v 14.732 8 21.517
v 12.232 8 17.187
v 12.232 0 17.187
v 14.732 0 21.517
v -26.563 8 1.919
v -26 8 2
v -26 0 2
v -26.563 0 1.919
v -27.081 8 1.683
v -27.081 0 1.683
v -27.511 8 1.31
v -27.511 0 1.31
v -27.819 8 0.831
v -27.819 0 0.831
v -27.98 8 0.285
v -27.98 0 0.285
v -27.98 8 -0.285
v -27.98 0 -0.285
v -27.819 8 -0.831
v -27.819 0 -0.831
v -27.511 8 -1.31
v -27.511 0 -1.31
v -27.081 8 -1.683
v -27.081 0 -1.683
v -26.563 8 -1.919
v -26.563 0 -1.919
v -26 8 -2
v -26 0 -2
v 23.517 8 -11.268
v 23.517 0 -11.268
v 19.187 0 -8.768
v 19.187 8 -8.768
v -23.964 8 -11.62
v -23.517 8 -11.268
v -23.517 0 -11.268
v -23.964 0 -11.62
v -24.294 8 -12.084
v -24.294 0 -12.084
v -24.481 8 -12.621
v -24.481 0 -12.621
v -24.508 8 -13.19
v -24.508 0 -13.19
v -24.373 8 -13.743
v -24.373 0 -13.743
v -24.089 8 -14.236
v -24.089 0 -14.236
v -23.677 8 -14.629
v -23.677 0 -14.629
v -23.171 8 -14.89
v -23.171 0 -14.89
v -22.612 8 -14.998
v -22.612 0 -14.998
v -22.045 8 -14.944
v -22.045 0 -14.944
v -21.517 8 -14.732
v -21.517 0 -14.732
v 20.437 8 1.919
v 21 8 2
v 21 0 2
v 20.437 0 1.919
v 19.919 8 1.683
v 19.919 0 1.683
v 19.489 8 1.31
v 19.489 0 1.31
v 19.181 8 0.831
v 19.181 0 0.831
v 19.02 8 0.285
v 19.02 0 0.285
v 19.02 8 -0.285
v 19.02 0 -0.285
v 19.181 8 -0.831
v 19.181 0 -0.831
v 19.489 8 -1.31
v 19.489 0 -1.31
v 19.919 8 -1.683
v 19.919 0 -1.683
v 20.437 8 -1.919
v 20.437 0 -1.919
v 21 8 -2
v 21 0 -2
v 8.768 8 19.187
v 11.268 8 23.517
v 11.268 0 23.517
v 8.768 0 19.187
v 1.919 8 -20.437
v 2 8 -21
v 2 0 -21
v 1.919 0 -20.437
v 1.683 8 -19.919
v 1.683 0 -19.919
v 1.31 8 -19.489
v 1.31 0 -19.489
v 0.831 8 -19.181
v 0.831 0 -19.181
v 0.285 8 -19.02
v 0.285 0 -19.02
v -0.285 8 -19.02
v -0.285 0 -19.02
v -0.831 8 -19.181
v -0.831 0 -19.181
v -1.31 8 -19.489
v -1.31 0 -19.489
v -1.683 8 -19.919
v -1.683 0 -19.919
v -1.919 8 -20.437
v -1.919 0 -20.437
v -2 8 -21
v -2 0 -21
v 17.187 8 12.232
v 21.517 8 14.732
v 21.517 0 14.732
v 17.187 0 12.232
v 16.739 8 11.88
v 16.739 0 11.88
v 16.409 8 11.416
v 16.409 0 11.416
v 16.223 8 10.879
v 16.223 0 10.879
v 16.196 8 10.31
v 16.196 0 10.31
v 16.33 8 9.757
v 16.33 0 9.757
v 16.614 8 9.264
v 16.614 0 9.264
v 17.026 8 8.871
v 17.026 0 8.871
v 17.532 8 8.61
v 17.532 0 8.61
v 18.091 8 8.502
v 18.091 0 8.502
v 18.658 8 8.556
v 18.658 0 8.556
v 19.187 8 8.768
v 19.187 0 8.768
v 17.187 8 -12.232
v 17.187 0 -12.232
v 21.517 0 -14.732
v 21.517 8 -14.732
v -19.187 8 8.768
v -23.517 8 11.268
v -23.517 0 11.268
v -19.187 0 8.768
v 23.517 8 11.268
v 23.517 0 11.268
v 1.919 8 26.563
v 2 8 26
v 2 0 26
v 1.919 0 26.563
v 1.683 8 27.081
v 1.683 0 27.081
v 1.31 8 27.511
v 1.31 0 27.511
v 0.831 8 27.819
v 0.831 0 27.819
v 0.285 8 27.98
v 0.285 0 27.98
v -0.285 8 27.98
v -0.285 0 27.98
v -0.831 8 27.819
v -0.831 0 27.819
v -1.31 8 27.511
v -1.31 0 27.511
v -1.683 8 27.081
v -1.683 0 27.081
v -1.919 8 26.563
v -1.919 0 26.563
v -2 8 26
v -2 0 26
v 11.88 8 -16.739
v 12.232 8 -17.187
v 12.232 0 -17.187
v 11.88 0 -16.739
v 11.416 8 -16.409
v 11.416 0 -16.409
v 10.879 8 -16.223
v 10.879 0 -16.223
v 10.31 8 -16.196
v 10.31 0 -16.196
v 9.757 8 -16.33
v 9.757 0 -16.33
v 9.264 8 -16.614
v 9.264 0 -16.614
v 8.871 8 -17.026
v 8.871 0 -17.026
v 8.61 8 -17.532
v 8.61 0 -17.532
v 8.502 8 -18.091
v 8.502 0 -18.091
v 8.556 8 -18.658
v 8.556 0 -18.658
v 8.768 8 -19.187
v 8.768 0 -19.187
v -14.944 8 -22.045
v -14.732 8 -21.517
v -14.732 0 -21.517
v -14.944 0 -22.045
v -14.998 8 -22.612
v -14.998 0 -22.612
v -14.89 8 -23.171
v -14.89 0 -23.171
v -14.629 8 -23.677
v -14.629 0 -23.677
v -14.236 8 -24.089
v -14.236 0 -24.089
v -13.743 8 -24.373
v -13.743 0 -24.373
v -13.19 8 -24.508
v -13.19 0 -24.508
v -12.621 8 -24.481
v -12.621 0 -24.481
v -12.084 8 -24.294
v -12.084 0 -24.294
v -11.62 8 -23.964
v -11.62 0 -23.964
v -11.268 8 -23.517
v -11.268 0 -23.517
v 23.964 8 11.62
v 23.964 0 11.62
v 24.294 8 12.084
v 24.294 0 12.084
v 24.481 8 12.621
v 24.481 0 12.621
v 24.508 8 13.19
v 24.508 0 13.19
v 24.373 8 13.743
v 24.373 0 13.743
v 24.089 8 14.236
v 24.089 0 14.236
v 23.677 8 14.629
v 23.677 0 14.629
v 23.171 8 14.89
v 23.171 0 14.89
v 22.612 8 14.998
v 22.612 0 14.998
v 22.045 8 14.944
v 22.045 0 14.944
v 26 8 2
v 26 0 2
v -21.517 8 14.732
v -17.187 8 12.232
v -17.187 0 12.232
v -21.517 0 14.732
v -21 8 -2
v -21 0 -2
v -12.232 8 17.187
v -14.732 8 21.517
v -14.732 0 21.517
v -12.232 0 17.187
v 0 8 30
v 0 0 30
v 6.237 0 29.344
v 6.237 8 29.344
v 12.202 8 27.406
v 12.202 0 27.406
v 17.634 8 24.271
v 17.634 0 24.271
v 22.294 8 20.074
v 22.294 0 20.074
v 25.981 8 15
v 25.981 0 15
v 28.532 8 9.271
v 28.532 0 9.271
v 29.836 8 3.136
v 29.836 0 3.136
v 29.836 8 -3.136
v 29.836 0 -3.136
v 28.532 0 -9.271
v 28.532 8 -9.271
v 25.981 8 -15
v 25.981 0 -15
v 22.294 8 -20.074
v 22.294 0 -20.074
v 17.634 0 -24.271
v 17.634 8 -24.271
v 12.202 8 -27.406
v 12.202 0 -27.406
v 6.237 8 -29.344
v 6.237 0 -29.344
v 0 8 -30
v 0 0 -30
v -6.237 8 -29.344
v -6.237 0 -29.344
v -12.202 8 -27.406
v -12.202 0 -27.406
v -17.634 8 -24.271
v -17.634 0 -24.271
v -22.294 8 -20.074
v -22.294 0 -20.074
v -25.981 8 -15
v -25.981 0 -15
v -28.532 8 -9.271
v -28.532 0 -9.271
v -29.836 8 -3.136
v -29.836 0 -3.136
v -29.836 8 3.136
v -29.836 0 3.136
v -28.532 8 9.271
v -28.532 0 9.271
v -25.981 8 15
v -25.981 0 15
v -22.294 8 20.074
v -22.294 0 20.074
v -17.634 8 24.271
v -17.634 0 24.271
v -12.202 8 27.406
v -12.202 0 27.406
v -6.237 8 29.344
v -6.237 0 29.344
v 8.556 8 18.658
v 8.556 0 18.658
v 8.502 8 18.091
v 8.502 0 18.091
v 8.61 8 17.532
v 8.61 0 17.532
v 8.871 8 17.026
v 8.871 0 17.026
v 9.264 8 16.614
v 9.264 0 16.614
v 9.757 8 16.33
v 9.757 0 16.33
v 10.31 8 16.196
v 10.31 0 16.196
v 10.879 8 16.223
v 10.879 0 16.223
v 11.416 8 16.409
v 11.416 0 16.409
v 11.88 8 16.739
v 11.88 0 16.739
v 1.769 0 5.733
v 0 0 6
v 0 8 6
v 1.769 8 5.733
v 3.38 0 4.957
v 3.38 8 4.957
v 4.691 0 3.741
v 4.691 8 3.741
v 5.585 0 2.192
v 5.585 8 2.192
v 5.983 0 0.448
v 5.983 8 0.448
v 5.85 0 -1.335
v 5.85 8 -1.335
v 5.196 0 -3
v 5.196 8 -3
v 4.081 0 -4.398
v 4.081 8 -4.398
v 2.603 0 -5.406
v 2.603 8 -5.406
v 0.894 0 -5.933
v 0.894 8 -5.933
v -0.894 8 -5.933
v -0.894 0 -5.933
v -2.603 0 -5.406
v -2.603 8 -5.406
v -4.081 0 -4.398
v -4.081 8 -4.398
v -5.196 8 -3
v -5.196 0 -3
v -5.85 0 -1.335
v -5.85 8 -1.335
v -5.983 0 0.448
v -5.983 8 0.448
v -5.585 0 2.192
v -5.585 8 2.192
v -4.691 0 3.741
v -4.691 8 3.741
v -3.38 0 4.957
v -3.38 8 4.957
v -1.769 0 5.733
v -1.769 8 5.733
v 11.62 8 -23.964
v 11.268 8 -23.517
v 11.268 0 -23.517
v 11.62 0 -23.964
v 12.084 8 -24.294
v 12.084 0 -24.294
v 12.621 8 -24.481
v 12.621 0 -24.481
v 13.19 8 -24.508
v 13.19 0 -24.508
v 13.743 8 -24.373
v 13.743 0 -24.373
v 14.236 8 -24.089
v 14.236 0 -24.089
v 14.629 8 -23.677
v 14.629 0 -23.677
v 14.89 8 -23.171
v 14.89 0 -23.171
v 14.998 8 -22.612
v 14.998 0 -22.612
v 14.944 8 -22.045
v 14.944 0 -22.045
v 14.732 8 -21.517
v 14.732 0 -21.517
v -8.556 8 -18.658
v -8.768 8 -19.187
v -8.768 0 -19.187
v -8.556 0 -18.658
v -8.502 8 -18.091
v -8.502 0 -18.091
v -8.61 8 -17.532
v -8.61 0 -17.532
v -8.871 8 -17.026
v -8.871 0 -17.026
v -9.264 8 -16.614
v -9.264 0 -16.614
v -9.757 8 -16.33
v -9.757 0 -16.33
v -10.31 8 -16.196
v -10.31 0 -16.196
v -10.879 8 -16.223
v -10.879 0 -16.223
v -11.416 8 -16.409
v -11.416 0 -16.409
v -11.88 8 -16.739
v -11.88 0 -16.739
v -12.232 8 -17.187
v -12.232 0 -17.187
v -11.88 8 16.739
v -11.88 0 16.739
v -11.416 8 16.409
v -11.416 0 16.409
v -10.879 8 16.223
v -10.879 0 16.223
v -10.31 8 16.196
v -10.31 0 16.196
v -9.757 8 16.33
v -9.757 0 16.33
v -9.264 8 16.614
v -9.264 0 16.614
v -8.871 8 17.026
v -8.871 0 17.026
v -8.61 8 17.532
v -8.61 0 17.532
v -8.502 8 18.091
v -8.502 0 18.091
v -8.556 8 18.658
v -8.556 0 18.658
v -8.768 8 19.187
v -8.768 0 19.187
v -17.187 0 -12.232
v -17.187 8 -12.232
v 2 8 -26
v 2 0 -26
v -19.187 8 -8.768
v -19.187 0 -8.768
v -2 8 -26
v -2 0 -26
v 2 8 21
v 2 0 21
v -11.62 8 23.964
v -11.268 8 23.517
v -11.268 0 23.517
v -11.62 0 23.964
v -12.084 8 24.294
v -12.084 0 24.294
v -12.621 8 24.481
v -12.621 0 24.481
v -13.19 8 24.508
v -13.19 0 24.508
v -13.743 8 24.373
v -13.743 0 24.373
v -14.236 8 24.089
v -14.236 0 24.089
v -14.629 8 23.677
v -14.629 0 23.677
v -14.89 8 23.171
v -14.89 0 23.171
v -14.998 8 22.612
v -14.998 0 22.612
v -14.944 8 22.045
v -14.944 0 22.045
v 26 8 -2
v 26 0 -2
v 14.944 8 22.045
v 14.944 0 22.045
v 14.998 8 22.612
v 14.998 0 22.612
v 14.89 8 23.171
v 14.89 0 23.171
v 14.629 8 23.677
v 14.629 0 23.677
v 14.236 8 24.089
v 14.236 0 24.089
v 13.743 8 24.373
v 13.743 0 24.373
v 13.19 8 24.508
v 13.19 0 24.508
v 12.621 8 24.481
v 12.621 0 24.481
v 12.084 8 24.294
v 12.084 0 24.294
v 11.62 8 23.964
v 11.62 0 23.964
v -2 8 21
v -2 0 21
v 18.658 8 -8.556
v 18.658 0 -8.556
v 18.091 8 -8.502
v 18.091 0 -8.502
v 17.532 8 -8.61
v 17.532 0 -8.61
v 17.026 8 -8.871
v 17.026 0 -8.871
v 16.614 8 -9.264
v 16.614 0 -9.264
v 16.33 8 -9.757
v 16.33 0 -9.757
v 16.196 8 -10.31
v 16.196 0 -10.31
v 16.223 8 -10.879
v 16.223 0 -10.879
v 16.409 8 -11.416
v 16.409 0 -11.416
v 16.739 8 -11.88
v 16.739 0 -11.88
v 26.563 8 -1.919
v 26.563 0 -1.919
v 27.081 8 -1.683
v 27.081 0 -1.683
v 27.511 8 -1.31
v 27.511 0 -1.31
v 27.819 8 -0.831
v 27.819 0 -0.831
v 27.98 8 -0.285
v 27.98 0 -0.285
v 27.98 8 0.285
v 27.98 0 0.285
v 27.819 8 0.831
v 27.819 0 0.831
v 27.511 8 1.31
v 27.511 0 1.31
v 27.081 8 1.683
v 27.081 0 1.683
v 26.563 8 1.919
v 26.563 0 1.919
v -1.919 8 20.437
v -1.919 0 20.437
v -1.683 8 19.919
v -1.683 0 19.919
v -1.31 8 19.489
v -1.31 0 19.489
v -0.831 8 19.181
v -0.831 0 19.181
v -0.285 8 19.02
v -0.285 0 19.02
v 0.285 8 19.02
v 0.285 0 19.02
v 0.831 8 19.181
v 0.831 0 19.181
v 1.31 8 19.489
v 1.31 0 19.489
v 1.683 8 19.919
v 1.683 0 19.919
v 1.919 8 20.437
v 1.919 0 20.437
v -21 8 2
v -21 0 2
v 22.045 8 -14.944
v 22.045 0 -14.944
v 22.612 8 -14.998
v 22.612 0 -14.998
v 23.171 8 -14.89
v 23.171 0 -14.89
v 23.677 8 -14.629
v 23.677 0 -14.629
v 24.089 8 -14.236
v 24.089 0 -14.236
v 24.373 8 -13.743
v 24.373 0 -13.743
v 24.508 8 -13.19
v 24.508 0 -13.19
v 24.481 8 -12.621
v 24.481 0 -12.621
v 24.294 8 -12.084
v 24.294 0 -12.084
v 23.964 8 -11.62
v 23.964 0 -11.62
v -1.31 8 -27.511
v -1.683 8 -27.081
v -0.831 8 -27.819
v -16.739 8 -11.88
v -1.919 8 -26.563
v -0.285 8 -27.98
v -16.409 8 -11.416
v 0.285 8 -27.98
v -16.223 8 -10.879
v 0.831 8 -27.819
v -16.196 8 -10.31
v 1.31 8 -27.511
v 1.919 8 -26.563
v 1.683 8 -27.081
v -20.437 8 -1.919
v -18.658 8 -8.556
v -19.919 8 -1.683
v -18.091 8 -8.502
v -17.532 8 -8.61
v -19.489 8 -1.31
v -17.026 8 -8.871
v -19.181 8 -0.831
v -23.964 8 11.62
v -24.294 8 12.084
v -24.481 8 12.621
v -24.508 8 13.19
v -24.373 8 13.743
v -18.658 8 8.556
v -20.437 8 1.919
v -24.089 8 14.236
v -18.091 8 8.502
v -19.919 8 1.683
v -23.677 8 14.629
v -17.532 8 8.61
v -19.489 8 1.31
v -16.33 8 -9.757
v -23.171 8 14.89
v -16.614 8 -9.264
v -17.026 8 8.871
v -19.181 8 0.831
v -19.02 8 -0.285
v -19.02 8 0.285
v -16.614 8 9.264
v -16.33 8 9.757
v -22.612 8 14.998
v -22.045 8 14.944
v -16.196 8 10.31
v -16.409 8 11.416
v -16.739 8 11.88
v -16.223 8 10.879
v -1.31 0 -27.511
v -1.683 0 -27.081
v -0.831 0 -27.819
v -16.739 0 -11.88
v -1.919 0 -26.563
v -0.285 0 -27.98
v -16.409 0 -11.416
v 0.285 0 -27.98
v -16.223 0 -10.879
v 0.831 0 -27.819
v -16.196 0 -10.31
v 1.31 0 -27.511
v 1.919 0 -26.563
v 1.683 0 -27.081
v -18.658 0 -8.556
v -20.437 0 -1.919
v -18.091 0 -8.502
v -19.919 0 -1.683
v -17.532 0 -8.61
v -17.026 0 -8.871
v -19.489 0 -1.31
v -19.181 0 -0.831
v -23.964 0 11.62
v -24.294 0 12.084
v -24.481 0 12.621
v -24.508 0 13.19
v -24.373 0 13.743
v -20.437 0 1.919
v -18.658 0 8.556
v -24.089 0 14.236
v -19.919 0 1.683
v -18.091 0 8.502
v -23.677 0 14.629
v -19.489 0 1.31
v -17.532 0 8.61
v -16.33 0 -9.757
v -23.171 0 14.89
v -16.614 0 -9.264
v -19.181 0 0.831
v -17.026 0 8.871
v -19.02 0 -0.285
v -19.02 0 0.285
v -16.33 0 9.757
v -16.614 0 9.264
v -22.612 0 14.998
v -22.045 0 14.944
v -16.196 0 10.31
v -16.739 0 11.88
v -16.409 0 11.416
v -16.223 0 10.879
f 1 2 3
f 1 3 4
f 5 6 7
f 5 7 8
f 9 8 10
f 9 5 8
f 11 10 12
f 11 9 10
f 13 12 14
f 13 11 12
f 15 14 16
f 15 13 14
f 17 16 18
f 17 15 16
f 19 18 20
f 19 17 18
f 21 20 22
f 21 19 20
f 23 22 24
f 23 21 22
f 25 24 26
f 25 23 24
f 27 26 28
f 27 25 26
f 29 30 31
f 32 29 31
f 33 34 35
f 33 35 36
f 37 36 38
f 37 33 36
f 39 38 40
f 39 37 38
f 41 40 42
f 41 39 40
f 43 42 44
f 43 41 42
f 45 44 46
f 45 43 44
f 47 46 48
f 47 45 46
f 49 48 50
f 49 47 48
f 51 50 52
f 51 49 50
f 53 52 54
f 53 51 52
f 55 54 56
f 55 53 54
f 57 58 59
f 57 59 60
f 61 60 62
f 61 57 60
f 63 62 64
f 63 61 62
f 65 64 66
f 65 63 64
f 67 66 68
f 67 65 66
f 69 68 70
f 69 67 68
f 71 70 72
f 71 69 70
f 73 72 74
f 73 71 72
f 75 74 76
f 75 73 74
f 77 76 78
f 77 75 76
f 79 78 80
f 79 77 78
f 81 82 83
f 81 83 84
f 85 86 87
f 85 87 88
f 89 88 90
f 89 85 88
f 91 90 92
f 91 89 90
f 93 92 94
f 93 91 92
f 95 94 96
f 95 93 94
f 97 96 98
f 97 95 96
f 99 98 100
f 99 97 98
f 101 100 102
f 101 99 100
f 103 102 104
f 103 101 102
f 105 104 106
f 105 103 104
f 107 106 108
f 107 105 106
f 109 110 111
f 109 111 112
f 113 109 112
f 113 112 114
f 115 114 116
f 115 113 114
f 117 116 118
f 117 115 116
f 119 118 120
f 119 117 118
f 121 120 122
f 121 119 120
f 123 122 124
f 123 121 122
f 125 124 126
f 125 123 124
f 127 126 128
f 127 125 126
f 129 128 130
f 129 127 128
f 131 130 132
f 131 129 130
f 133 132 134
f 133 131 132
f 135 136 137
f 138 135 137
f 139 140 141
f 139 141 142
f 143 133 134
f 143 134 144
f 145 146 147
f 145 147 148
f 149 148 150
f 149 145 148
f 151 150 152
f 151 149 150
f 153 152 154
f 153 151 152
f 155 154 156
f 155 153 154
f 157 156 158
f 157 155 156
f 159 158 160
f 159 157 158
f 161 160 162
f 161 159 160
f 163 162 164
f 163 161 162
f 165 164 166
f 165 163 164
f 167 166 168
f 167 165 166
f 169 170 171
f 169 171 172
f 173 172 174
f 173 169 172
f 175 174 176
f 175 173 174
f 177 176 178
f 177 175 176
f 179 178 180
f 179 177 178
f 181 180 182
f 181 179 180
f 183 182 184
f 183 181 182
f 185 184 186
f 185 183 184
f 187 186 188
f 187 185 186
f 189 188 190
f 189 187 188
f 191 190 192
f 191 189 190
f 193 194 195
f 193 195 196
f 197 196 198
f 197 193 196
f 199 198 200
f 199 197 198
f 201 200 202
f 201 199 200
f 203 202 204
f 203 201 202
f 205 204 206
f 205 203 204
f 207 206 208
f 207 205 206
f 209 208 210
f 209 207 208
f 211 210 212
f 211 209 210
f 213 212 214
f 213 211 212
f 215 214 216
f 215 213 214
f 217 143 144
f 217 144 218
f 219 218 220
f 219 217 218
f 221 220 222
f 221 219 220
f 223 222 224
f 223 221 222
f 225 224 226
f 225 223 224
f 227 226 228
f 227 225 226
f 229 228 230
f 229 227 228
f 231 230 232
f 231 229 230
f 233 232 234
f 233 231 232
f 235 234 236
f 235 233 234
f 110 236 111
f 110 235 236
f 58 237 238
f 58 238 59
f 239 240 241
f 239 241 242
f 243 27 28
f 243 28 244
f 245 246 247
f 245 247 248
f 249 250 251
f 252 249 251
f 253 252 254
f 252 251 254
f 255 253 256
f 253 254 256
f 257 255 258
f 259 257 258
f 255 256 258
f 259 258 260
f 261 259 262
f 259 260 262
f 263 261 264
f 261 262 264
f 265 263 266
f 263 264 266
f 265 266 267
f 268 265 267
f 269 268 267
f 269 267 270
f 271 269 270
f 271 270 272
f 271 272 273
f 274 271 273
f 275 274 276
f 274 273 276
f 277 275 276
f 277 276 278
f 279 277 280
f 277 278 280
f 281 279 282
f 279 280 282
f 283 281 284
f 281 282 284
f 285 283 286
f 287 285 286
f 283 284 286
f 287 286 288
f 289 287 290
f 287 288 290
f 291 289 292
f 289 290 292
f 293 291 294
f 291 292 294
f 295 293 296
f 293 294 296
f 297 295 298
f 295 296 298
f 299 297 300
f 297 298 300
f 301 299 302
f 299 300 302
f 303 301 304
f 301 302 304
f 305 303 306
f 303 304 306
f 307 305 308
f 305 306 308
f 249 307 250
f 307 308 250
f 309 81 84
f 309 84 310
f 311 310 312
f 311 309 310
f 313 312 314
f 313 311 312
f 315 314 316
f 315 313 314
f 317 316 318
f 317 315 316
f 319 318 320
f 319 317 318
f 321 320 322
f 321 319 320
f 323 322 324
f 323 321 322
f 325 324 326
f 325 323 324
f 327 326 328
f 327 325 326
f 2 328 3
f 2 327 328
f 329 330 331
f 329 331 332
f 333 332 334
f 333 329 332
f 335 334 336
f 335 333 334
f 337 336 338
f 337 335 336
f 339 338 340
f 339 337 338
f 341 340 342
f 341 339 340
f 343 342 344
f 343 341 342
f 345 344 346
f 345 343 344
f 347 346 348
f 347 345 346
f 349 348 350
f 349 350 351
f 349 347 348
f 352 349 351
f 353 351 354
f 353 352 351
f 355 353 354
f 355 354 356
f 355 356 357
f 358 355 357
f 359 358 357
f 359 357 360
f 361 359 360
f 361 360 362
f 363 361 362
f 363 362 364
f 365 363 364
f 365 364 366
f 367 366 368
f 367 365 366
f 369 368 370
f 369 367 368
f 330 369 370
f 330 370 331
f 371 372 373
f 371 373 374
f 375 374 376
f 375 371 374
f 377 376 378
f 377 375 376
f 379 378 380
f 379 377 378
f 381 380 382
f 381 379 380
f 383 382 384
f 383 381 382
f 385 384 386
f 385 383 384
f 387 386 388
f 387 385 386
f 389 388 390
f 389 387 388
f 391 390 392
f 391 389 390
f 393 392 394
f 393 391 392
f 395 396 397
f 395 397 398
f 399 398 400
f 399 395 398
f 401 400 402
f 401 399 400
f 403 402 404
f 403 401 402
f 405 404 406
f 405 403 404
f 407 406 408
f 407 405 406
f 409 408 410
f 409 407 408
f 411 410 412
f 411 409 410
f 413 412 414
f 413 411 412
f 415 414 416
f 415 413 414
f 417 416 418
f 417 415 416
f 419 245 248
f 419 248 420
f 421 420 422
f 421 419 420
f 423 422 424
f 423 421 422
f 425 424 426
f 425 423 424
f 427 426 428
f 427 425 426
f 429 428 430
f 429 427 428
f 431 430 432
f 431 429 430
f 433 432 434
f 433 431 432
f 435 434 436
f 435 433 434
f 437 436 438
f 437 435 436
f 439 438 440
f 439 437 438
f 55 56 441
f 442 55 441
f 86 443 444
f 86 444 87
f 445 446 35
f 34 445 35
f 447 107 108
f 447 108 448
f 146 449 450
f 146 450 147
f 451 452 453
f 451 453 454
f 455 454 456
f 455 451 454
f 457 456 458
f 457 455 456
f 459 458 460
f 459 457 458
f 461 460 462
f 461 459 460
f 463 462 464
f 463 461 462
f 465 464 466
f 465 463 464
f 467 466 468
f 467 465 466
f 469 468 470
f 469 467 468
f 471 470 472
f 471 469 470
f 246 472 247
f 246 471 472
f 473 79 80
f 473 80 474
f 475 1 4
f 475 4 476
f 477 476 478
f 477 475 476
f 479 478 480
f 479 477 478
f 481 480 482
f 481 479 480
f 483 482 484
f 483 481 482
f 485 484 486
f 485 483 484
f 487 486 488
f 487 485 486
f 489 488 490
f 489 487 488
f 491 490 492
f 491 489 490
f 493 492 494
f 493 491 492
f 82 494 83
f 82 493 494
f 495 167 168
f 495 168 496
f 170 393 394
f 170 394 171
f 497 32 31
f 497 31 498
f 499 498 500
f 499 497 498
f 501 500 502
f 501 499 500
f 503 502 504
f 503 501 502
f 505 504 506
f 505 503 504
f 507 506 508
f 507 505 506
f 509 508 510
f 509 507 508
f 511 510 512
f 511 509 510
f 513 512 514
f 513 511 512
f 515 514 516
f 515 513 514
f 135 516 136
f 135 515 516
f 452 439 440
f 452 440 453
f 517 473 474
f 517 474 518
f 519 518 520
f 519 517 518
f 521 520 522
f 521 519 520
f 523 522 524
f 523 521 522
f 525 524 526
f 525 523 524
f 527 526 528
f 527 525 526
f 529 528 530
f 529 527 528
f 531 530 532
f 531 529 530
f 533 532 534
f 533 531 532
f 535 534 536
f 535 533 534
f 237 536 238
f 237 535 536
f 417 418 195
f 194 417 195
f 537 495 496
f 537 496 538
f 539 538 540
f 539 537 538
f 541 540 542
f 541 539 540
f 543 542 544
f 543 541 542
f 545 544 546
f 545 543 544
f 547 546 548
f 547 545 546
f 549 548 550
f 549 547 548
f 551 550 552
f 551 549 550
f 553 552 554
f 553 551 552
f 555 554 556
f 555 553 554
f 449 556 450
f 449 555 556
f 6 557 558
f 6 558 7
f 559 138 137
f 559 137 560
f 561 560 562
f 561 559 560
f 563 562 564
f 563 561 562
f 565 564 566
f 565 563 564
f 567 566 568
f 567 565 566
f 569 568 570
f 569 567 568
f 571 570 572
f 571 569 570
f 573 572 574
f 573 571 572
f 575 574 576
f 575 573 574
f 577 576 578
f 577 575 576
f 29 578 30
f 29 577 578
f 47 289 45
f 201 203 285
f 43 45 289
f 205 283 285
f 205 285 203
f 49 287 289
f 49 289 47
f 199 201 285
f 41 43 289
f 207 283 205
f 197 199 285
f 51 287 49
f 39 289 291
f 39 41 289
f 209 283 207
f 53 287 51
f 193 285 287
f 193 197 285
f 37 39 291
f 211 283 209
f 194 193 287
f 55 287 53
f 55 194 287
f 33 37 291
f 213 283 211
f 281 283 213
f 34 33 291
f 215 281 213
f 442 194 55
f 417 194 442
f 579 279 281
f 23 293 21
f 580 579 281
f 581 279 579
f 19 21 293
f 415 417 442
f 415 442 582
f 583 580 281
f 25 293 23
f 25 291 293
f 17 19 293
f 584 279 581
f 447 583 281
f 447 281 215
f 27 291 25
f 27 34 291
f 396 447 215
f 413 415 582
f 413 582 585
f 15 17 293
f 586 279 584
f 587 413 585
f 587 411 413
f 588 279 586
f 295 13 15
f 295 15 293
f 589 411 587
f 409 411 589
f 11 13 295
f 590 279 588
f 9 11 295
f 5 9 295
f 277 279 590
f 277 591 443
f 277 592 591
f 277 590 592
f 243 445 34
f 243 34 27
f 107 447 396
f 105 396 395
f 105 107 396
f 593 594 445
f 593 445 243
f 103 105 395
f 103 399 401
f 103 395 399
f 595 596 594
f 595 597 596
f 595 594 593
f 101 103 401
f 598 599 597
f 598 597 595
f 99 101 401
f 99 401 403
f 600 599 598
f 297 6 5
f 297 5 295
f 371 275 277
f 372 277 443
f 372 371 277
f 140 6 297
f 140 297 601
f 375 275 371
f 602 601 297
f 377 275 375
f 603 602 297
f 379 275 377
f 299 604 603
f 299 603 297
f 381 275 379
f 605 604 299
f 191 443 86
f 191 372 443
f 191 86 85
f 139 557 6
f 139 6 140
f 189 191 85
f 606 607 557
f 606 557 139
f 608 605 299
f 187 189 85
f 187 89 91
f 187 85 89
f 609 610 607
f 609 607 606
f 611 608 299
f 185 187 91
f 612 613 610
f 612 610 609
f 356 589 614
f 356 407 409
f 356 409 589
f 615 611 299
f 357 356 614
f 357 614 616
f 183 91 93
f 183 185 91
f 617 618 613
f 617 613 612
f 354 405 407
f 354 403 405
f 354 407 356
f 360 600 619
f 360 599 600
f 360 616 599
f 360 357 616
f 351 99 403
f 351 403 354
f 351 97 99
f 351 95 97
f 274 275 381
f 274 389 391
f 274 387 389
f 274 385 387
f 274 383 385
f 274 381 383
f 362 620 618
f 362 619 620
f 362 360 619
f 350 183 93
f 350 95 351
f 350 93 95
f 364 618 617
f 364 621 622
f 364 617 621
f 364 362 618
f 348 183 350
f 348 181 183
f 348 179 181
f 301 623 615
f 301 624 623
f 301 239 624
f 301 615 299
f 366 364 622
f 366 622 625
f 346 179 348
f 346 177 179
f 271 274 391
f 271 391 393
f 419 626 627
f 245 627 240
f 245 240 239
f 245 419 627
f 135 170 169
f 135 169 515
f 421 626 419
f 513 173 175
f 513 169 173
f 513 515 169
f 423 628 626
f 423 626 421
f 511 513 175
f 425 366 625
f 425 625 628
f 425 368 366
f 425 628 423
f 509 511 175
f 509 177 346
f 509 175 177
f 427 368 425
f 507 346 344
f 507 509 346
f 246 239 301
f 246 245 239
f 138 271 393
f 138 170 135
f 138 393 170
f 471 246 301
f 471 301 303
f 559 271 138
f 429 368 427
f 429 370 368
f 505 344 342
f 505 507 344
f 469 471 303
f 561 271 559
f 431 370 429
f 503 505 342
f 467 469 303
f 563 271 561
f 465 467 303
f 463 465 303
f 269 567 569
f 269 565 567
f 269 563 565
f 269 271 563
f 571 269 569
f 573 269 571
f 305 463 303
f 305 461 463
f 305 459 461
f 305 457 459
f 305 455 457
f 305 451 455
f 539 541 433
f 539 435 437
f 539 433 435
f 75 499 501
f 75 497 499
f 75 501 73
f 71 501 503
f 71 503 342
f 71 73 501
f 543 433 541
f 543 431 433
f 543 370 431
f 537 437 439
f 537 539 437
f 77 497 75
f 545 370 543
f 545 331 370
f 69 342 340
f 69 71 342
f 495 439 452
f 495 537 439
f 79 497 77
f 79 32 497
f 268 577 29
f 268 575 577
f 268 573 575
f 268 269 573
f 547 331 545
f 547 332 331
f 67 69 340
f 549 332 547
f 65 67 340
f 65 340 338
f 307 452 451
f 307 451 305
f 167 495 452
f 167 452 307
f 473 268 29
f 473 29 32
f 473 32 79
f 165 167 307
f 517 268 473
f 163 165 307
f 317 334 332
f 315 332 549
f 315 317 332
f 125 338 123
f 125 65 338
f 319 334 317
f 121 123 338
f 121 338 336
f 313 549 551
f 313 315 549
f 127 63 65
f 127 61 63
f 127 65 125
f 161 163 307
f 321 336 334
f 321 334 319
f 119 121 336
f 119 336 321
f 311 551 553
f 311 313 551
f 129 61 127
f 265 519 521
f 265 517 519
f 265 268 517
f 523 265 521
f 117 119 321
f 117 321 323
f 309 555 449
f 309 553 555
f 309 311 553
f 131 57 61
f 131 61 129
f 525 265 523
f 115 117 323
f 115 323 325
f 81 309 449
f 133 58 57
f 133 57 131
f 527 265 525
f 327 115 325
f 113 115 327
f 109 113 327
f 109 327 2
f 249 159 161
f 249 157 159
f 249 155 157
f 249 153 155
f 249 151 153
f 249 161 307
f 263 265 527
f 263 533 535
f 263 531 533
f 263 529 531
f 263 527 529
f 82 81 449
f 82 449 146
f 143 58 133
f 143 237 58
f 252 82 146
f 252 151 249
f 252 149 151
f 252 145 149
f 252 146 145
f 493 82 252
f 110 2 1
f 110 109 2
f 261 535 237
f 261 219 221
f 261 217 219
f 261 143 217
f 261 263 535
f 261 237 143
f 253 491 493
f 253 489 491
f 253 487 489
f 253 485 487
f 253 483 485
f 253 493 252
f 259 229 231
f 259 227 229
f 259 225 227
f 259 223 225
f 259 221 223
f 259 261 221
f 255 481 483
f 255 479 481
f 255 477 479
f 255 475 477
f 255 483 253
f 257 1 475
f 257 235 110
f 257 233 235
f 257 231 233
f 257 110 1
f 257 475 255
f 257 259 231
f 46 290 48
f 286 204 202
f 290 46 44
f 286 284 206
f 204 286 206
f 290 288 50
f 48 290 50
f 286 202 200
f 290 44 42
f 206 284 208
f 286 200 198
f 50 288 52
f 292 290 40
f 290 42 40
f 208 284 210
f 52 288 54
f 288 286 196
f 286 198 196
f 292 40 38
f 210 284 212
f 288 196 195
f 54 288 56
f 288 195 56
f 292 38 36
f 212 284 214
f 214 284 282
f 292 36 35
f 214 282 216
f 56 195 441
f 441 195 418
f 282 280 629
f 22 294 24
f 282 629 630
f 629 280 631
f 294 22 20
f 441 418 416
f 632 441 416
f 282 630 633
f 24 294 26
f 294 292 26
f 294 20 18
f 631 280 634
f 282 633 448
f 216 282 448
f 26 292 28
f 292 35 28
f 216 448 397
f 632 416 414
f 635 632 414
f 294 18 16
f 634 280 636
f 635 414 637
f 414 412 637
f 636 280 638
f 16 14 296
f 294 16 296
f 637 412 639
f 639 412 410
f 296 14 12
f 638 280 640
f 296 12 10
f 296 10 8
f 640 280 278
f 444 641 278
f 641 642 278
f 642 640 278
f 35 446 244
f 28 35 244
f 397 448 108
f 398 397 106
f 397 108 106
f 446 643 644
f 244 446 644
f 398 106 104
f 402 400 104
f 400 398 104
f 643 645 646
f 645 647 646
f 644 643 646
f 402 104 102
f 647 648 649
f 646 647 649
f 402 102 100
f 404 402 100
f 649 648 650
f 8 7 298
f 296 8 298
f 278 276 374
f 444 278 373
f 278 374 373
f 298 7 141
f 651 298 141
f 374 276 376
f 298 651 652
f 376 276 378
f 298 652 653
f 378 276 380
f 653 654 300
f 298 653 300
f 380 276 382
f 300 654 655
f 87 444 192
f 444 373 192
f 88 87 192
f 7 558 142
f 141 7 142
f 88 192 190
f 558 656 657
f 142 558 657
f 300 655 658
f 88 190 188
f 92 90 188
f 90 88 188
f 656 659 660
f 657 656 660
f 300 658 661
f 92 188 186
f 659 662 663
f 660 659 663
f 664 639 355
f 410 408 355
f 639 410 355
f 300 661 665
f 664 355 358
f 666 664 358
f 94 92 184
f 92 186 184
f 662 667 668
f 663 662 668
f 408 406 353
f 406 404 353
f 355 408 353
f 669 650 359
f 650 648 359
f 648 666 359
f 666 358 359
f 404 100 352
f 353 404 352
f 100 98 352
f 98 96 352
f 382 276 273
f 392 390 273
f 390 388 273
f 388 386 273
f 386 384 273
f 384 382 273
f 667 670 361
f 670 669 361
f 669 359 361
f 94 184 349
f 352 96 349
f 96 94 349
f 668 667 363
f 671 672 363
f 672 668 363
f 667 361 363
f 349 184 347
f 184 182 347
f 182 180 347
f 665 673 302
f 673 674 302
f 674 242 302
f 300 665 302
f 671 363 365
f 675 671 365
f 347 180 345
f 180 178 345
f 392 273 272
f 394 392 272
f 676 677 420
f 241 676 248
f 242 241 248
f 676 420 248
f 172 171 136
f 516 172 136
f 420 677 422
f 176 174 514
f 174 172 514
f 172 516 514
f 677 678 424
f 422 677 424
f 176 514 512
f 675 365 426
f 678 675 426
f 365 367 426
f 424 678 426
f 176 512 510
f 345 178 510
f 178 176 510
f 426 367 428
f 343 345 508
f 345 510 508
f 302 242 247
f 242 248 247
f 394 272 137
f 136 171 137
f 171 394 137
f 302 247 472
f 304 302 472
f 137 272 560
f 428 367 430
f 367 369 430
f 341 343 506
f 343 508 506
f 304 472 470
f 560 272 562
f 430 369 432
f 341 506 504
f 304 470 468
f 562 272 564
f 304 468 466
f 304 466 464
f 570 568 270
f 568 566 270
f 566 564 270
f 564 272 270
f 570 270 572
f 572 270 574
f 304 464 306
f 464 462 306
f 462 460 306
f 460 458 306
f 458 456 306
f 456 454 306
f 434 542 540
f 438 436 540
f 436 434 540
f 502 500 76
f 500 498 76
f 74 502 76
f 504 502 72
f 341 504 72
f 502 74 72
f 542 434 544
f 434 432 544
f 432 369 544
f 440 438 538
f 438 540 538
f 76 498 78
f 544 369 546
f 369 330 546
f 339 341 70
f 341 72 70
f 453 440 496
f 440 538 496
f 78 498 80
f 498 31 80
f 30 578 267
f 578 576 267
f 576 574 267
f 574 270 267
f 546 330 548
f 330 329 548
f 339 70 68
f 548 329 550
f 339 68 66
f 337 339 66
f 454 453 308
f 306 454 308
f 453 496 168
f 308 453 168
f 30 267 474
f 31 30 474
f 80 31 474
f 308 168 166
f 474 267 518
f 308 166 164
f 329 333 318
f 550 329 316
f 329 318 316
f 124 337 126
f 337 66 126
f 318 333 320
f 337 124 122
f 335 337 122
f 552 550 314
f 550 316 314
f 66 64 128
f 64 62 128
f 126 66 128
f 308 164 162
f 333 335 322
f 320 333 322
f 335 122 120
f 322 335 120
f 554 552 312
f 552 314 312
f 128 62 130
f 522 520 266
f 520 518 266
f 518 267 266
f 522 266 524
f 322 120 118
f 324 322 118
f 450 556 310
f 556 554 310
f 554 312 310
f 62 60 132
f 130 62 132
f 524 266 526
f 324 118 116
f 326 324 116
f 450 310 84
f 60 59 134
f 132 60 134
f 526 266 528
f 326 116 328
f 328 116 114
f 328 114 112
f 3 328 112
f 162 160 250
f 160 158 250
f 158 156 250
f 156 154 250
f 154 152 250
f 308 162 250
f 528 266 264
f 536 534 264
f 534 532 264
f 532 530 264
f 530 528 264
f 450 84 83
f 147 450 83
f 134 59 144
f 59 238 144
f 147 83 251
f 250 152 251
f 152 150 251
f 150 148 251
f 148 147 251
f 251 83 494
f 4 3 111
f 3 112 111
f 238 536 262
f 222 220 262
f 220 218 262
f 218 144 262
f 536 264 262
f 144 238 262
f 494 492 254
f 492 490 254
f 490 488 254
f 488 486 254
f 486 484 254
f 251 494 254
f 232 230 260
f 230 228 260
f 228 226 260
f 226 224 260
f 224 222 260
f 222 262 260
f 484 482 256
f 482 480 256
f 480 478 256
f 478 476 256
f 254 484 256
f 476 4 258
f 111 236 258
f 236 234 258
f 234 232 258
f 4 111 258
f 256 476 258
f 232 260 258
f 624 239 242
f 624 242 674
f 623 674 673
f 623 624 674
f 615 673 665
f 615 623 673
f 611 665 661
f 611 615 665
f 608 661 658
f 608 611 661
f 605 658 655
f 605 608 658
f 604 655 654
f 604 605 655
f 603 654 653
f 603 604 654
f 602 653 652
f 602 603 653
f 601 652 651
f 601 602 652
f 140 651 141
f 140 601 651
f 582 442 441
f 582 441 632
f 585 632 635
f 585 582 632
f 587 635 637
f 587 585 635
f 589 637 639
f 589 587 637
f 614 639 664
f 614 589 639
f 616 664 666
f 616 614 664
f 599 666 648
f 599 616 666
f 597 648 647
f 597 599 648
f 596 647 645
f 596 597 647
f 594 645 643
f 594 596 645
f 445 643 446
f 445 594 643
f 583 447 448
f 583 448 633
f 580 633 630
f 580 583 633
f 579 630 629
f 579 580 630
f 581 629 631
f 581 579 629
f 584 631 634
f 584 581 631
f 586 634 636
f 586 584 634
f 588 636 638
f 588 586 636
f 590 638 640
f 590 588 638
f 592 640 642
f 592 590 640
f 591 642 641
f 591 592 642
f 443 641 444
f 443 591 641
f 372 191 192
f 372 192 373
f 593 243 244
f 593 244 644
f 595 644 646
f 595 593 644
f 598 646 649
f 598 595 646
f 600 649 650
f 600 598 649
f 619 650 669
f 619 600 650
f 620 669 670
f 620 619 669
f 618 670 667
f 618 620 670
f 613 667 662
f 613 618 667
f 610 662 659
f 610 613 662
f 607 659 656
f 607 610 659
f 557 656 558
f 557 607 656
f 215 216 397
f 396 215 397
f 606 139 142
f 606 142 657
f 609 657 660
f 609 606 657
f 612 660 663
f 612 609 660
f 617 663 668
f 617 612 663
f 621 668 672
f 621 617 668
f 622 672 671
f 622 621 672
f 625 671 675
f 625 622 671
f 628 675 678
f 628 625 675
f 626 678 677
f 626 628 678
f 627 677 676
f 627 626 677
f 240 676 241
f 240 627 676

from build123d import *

# Parameters (mm, degrees)
SKETCH_1_R               = 30
SKETCH_1_R_2             = 6
EXTRUDE_1_DEPTH          = 8
CUT_EXTRUDE_1_DEPTH      = 61
PATTERN_CIRCULAR_1_COUNT = 12


with BuildPart() as part:
    # 草图1 → 凸台-拉伸1 (new body)
    with BuildSketch(Plane(origin=(0, 0, 0), x_dir=(1, 0, 0), z_dir=(0, 1, 0))):
        Circle(SKETCH_1_R)
        Circle(SKETCH_1_R_2, mode=Mode.SUBTRACT)
    extrude(amount=EXTRUDE_1_DEPTH)

    # 草图2 → 切除-拉伸1 (cut, symmetric)
    with BuildSketch(Plane(origin=(0, 0, 0), x_dir=(1, 0, 0), z_dir=(0, 1, 0))):
        with BuildLine():
            Line((21, 2), (26, 2))
            ThreePointArc((26, 2), (28, 0), (26, -2))
            Line((26, -2), (21, -2))
            ThreePointArc((21, -2), (19, 0), (21, 2))
        make_face()
    cut_extrude_1 = extrude(amount=CUT_EXTRUDE_1_DEPTH, both=True, mode=Mode.SUBTRACT)

    # 阵列(圆周)1: 切除-拉伸1 ×12 about axis
    pattern_circular_1_axis = Axis((0, -0.4, 0), (0, 1, 0))
    for i in range(1, PATTERN_CIRCULAR_1_COUNT):
        add(cut_extrude_1.rotate(pattern_circular_1_axis, i * 360 / PATTERN_CIRCULAR_1_COUNT), mode=Mode.SUBTRACT)


solid = part.part
